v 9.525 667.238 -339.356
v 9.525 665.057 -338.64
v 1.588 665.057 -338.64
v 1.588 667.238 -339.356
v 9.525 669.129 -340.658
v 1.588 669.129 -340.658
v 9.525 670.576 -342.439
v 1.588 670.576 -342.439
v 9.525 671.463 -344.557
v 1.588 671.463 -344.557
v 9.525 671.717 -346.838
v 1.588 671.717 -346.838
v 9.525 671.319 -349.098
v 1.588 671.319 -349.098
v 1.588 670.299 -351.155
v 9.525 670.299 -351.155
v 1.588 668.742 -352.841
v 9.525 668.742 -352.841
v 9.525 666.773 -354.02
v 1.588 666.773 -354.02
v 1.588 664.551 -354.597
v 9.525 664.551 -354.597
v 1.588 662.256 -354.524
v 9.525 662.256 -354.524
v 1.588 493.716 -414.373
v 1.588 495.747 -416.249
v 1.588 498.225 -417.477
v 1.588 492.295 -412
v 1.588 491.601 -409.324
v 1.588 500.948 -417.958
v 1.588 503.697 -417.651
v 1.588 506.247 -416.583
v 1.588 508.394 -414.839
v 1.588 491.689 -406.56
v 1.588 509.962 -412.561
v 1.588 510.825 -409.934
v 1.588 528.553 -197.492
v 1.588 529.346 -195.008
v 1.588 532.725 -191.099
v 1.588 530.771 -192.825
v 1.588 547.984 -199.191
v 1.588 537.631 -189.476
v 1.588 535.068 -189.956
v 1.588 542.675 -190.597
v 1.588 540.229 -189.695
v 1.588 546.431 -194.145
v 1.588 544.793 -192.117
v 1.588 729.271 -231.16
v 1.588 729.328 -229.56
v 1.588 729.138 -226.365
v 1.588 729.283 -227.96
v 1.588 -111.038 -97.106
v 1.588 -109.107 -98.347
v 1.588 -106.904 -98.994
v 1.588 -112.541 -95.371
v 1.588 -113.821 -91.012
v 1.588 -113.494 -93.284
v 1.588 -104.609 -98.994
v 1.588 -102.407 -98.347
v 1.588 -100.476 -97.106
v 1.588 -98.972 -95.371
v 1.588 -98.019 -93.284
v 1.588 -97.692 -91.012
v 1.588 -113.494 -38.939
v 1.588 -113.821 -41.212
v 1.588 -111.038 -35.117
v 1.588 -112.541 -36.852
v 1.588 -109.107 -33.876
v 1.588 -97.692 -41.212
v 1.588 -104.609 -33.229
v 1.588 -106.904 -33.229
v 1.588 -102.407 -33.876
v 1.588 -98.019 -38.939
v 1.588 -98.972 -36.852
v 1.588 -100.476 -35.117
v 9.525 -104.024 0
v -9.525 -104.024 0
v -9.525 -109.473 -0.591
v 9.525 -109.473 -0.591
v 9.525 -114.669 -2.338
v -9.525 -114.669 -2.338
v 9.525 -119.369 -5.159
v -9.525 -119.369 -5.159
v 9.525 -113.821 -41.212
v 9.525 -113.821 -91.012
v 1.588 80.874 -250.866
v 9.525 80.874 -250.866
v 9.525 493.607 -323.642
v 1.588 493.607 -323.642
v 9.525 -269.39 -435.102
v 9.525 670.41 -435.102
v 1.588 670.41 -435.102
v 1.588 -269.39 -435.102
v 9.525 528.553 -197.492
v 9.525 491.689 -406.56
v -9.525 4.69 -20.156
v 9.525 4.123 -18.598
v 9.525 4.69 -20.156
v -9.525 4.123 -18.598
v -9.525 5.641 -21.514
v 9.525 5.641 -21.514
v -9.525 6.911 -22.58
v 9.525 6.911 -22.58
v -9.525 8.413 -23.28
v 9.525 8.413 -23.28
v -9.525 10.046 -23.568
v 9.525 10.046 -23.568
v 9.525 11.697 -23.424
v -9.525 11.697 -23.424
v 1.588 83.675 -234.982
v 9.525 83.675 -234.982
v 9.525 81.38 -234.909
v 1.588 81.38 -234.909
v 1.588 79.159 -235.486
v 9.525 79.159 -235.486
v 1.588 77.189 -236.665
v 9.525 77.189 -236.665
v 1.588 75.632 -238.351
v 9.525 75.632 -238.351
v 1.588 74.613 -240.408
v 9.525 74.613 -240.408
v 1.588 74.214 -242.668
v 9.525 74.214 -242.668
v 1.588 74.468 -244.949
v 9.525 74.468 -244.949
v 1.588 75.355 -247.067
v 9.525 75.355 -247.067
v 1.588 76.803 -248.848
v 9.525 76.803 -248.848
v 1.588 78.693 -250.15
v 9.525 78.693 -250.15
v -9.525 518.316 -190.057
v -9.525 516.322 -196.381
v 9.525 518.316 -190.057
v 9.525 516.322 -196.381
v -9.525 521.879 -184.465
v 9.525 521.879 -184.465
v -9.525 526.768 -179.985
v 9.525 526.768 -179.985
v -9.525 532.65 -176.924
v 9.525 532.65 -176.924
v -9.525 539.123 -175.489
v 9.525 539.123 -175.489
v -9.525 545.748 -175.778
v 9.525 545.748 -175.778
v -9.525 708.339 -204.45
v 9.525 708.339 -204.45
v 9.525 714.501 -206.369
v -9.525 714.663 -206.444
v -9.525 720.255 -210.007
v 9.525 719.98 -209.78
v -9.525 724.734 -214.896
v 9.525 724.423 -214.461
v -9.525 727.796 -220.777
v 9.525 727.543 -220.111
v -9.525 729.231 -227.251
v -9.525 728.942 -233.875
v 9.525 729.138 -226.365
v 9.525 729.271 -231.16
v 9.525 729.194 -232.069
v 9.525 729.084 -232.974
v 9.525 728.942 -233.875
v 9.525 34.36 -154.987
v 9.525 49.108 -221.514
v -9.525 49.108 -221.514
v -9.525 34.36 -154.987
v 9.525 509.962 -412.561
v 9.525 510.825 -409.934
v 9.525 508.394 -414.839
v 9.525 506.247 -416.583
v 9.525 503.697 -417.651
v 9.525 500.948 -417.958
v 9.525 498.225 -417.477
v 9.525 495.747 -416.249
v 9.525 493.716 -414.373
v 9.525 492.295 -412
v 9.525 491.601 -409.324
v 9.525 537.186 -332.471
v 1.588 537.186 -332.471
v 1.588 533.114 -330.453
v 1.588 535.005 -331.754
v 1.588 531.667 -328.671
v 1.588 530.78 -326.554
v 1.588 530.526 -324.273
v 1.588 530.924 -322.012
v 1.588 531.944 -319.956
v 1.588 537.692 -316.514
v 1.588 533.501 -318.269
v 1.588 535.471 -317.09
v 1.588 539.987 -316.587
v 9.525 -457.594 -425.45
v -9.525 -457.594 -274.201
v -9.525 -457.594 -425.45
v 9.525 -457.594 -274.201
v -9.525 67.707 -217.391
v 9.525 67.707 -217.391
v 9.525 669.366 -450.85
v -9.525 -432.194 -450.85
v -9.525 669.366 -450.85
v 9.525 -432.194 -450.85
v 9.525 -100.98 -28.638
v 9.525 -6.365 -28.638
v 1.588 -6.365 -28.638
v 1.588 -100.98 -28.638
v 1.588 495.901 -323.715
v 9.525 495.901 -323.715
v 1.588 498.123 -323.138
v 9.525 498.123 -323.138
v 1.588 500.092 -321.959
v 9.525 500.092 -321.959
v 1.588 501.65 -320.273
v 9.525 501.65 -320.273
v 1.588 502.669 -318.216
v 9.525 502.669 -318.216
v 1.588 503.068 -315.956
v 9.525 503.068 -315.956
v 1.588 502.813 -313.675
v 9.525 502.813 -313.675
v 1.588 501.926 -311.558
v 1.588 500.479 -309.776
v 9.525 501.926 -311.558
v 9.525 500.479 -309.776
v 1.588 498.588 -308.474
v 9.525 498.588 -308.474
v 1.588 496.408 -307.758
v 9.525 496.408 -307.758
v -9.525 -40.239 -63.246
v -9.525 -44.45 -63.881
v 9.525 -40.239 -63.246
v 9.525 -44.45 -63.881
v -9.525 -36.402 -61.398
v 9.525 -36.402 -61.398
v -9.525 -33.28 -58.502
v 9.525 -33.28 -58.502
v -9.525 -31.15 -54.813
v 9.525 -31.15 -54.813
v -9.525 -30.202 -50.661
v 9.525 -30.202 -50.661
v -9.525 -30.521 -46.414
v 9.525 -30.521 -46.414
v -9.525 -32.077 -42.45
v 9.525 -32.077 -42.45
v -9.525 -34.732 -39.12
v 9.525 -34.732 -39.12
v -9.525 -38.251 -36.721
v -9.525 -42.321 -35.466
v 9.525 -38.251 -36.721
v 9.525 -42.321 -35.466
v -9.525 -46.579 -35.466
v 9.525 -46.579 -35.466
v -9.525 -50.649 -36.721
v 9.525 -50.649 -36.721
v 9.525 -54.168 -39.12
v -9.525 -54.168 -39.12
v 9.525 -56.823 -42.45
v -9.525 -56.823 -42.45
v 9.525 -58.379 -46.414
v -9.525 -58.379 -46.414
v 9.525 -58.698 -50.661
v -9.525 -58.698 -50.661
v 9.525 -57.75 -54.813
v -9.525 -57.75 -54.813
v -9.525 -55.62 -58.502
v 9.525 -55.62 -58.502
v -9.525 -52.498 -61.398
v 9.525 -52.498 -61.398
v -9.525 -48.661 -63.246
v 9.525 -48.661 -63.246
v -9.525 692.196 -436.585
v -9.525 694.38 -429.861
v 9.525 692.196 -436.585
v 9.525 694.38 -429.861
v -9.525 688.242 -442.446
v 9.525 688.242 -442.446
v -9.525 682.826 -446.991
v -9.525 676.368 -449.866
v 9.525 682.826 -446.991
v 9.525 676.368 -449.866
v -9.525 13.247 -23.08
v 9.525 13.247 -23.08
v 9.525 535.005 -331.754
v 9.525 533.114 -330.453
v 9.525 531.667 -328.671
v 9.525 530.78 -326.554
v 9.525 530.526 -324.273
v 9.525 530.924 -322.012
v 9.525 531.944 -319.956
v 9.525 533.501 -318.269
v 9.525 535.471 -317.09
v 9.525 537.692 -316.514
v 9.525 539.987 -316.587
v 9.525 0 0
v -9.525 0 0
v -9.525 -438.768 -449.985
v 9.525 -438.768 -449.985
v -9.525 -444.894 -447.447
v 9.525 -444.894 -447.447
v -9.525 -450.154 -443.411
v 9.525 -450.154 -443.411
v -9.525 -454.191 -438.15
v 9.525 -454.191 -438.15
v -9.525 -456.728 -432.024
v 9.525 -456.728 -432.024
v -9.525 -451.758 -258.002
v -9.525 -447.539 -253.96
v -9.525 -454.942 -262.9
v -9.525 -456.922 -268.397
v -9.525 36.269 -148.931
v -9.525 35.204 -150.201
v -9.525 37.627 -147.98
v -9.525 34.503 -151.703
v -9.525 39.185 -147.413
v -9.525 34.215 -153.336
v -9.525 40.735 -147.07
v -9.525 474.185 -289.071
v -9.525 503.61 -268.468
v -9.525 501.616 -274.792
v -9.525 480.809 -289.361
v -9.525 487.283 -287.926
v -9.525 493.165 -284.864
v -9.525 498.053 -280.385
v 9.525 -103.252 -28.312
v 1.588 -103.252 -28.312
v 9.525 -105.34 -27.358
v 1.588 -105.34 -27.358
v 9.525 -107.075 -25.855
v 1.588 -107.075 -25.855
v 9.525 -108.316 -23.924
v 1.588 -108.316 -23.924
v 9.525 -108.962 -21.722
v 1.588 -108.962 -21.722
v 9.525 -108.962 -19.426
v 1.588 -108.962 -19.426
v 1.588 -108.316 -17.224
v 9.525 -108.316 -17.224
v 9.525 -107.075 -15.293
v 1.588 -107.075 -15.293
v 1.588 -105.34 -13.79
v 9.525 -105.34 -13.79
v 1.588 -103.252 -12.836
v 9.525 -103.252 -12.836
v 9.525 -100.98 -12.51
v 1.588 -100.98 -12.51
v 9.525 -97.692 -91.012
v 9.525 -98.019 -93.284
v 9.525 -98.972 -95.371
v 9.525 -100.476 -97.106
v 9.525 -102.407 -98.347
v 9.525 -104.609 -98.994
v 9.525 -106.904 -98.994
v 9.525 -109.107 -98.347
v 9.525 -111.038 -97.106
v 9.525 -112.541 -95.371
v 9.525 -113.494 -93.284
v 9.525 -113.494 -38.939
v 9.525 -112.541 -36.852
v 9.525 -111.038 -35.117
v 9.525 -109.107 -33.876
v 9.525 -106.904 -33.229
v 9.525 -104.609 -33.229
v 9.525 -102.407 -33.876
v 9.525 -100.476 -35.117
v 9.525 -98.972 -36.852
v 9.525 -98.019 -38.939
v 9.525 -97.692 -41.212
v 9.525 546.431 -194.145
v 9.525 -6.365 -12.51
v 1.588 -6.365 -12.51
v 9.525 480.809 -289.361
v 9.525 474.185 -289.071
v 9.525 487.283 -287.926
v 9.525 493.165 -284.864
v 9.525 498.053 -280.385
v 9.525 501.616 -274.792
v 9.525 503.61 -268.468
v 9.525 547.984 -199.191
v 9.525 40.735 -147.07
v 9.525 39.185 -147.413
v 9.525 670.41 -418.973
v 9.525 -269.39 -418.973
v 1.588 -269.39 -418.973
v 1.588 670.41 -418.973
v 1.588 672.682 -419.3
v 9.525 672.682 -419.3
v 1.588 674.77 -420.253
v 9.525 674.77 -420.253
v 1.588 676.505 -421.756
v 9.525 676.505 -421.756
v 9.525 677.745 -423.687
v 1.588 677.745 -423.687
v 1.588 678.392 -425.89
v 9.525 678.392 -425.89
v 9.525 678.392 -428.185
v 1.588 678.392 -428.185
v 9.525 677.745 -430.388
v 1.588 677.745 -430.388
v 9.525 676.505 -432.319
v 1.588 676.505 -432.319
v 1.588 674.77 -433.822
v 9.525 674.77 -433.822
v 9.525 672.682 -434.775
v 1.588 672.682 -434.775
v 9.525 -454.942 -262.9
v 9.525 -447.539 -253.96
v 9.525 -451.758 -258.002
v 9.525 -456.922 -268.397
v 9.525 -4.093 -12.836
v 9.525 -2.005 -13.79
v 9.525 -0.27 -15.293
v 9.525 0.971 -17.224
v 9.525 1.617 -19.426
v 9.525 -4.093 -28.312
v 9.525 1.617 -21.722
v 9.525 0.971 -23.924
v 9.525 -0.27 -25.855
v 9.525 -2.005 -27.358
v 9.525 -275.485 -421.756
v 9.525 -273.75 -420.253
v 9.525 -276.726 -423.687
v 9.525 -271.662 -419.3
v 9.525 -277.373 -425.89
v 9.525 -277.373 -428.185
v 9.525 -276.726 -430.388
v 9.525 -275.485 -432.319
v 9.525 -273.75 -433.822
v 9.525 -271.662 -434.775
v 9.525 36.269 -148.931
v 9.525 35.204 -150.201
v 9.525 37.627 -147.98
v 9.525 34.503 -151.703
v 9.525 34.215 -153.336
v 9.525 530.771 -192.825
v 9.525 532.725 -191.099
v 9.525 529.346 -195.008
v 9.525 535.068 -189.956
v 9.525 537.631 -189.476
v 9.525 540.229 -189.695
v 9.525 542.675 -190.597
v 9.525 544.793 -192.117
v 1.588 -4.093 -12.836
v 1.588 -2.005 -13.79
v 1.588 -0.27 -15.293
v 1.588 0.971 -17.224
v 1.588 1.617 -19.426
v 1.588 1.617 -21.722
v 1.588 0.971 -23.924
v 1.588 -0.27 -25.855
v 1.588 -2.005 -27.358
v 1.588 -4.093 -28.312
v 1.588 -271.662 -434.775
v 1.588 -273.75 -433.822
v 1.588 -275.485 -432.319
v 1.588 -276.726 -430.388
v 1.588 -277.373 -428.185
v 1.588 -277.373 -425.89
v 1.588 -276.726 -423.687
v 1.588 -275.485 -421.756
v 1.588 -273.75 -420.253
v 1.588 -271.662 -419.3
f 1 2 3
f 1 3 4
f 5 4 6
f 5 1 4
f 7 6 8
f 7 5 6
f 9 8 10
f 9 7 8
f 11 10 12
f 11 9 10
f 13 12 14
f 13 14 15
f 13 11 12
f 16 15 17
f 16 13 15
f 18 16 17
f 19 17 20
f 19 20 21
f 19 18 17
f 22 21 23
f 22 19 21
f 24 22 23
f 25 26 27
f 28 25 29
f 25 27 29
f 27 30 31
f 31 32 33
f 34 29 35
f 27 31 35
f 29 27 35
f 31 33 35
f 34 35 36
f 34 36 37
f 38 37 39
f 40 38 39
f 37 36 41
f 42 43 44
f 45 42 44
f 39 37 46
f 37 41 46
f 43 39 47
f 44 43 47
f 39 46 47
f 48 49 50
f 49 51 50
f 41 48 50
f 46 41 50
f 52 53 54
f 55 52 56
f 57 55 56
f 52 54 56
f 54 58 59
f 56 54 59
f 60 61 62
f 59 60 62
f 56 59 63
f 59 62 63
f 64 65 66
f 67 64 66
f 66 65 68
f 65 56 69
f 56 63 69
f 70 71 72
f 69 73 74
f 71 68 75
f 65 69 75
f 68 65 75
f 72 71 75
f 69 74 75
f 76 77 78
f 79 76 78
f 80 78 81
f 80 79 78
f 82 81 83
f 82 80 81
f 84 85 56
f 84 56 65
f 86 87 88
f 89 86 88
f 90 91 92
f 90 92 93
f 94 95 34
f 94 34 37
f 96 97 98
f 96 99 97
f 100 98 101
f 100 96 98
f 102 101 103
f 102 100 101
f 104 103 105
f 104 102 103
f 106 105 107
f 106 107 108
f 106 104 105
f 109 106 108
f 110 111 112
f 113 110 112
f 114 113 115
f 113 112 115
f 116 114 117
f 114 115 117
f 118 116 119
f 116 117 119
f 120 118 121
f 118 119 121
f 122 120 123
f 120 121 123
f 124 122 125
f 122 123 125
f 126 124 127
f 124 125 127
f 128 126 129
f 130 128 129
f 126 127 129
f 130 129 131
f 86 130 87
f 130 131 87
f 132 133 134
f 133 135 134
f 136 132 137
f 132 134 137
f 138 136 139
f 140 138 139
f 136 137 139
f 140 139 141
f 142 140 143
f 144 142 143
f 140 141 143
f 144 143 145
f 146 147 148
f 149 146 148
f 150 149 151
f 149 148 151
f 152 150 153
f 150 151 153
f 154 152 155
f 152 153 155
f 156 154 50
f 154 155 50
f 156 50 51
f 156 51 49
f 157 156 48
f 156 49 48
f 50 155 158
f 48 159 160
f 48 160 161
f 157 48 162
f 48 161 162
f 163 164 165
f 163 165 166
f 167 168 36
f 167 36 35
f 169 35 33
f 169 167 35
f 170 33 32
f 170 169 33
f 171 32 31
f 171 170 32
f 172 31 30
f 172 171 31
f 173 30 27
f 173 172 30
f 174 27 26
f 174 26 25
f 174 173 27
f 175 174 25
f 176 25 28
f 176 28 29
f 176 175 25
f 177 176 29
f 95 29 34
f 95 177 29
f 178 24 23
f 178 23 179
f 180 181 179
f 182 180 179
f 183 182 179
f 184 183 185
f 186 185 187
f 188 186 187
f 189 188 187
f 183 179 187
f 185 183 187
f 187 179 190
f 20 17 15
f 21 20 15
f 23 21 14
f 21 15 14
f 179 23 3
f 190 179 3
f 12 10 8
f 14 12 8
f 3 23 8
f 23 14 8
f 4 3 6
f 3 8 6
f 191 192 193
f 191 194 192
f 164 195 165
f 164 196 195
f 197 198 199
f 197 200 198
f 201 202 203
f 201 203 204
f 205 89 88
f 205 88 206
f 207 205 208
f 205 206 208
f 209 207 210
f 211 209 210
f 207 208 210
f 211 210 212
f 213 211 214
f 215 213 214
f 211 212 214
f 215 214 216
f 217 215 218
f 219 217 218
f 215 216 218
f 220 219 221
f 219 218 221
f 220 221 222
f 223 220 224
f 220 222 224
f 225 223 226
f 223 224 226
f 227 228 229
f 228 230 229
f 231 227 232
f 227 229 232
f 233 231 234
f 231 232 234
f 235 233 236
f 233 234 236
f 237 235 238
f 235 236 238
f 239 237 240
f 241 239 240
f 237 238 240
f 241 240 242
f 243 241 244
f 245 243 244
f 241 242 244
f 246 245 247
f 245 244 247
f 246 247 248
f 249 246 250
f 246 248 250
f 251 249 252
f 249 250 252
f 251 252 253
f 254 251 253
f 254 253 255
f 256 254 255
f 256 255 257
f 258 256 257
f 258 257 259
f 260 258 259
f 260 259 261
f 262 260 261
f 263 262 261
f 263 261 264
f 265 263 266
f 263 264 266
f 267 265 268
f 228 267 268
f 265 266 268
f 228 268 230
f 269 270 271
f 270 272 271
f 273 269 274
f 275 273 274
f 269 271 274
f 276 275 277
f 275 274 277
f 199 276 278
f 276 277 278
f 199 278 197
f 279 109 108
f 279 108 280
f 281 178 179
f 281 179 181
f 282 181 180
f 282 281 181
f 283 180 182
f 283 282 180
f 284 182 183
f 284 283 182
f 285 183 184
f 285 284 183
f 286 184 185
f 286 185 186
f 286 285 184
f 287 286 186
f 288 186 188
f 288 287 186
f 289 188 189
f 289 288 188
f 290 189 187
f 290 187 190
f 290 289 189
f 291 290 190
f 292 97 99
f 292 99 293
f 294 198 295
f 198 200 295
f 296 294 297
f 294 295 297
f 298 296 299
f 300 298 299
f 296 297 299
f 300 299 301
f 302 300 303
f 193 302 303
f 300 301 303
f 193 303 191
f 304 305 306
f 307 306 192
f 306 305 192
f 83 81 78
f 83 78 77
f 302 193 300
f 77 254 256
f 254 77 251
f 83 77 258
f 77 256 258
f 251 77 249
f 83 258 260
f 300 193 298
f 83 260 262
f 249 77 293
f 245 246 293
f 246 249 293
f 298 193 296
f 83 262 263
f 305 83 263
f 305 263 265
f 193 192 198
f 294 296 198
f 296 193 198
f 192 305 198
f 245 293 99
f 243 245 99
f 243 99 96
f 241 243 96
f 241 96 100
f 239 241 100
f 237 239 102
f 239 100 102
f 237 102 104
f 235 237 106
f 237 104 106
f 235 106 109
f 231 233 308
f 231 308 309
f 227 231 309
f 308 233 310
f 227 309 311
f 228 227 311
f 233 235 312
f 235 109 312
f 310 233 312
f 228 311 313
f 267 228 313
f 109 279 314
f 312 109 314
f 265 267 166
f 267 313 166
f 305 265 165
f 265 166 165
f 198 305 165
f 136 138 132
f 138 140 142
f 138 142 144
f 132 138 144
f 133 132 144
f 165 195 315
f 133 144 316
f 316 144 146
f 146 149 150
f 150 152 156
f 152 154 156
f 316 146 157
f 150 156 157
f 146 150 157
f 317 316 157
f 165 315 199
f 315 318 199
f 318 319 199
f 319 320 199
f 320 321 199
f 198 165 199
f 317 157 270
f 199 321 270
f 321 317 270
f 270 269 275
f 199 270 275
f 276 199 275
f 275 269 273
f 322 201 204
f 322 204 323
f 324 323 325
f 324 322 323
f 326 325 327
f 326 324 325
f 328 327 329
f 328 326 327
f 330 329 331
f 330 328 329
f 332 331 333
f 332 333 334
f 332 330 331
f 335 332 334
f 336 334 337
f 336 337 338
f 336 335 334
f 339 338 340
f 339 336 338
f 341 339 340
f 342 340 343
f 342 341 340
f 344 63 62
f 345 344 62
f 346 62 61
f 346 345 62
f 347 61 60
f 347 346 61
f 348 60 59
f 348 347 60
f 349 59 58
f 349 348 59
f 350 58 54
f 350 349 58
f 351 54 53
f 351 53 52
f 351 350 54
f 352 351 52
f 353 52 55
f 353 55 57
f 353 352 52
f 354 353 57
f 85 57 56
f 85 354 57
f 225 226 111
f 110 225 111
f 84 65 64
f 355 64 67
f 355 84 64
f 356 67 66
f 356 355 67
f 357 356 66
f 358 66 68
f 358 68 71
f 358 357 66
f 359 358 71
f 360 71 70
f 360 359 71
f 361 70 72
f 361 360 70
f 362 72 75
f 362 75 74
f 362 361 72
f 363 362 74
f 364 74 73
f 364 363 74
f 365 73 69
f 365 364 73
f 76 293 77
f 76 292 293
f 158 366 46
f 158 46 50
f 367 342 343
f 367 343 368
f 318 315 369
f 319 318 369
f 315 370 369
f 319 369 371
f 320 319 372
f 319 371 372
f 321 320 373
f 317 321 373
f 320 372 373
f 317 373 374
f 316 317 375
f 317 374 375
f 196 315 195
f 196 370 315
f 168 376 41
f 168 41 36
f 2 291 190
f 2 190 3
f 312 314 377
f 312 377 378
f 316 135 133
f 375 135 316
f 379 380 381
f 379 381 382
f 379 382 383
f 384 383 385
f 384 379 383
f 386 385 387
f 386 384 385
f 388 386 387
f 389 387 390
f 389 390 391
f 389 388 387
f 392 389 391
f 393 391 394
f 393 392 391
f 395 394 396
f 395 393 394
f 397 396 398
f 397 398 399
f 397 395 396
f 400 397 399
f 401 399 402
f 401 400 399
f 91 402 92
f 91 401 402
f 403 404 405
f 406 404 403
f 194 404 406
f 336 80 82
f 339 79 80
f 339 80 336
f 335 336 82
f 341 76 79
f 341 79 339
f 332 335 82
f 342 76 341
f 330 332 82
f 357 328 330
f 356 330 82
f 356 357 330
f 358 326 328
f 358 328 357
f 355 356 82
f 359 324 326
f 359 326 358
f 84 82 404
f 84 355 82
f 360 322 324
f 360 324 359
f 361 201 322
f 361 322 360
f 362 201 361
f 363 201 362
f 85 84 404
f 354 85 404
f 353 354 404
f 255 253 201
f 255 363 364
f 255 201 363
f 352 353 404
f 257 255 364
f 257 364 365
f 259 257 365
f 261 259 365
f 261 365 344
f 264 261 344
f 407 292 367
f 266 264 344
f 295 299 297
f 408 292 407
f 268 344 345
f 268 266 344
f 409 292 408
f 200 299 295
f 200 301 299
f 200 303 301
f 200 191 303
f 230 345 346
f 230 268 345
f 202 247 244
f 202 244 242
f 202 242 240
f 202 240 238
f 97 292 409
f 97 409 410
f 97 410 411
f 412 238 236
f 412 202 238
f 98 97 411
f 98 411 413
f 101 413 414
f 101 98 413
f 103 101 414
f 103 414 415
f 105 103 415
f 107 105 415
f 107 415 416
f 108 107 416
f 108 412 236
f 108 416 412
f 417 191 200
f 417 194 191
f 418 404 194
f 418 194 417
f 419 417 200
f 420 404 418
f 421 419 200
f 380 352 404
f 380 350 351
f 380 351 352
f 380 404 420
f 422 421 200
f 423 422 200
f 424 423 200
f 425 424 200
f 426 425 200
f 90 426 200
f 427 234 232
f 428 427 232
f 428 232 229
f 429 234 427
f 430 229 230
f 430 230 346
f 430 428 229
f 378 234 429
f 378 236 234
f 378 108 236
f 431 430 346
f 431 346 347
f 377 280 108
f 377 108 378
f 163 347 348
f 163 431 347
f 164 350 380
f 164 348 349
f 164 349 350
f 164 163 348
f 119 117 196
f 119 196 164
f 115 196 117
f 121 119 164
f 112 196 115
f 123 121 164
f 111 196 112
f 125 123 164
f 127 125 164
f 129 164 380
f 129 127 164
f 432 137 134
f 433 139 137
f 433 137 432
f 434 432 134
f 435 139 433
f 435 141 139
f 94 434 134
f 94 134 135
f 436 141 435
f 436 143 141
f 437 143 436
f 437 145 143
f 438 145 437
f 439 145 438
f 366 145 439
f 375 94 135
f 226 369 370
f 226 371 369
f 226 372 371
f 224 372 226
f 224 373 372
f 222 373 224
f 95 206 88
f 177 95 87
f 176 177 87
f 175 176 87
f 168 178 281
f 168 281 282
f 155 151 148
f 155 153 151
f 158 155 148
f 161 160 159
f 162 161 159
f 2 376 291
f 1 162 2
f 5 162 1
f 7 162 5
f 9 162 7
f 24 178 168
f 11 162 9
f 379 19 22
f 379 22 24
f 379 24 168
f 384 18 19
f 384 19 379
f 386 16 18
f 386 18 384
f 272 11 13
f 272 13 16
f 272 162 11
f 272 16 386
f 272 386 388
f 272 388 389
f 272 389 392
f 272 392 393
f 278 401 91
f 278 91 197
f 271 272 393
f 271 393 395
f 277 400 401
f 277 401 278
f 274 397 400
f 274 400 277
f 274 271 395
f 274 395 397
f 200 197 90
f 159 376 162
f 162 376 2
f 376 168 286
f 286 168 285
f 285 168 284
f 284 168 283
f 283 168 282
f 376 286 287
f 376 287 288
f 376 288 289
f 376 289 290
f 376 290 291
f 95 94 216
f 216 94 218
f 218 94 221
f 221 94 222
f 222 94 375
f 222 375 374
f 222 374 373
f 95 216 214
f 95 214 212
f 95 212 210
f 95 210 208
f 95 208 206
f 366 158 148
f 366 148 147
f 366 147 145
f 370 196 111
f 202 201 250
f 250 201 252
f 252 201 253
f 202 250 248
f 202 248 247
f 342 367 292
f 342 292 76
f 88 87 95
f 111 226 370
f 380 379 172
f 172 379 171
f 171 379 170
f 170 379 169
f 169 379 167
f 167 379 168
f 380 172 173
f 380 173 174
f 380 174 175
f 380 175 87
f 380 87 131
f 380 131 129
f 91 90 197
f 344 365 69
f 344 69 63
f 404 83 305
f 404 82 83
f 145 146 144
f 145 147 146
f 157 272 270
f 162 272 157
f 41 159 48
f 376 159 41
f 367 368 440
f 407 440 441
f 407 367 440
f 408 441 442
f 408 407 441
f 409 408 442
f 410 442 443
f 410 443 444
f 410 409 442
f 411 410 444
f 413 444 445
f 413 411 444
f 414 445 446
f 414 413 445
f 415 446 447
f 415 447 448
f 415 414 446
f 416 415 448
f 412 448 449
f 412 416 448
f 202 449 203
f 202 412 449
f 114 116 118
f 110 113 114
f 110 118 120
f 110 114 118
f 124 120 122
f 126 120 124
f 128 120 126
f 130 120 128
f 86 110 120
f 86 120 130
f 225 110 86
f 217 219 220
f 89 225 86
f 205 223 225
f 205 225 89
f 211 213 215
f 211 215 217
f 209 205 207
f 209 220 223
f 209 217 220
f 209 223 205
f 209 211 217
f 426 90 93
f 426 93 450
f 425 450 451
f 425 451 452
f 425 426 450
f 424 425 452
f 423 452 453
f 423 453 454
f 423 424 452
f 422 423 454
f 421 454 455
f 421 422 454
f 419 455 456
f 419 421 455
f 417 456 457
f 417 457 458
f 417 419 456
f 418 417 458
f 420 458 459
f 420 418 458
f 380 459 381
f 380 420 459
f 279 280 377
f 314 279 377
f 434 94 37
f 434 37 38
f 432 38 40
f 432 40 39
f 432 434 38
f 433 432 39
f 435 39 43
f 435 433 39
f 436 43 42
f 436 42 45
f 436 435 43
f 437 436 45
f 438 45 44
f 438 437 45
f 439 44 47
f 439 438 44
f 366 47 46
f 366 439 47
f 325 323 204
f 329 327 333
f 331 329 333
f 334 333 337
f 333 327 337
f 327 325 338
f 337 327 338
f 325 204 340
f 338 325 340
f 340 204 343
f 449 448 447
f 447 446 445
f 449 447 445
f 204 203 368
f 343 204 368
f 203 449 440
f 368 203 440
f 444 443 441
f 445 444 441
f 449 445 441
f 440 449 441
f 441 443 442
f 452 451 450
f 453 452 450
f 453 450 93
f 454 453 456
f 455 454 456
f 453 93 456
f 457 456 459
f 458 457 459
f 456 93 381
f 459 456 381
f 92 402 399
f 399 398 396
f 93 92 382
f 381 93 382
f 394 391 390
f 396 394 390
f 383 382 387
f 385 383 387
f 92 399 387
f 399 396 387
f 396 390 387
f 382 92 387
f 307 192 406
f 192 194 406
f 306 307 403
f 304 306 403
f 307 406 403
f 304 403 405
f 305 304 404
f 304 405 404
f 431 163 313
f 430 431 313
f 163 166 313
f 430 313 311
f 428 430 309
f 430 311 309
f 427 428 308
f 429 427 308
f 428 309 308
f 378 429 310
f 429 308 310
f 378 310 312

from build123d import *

# Parameters (mm, degrees)
BOSS_EXTRUDE1_DEPTH     = 9.525
FILLET1_R               = 25.4
BOSS_EXTRUDE2_DEPTH     = 19.05
FILLET2_R               = 6.35
CUT_EXTRUDE1_DEPTH      = 7.9375
SKETCH9_R               = 14.2875
CUT_EXTRUDE3_DEPTH      = 10.525
CUT_EXTRUDE3_DEPTH_BACK = 10.525


with BuildPart() as part:
    # Sketch1 → Boss-Extrude1 (new body, symmetric)
    with BuildSketch(Plane(origin=(0, 0, 0), x_dir=(0, 0, -1), z_dir=(1, 0, 0))):
        Polygon((0, 0), (0, -112.563749307), (261.582885953, -457.593888215), (450.85, -457.593888215), (450.85, 690.679166755), (208.861297127, 733.352902663), (171.366736958, 520.733599781), (293.482501466, 499.198975136), (217.390599948, 67.706860465), (221.513774593, 49.108421529), align=None)
    extrude(amount=BOSS_EXTRUDE1_DEPTH, both=True)

    # Fillet1
    fillet1_edges = [part.edges().sort_by_distance(p)[0] for p in [
        (0, 499.198975136, -293.482501466),
        (0, 520.733599781, -171.366736958),
        (0, 733.352902663, -208.861297127),
        (0, 690.679166755, -450.85),
        (0, -457.593888215, -450.85),
        (0, -457.593888215, -261.582885953),
        (0, -112.563749307, 0),
    ]]
    fillet(fillet1_edges, radius=FILLET1_R)

    # Sketch5 → Boss-Extrude2 (add)
    with BuildSketch(Plane(origin=(9.525, 0, 0), x_dir=(0, 0, -1), z_dir=(1, 0, 0))):
        Polygon((24.797918581, 5.497566194), (23.079929145, 13.246915751), (147.069522049, 40.734746721), (148.787511485, 32.985397164), align=None)
    extrude(amount=-BOSS_EXTRUDE2_DEPTH)

    # Fillet2
    fillet2_edges = [part.edges().sort_by_distance(p)[0] for p in [
        (0, 32.985397164, -148.787511485),
        (0, 5.497566194, -24.797918581),
    ]]
    fillet(fillet2_edges, radius=FILLET2_R)

    # Sketch6 → Cut-Extrude1 (cut)
    with BuildSketch(Plane(origin=(9.525, 0, 0), x_dir=(0, 0, -1), z_dir=(1, 0, 0))):
        with BuildLine():
            Line((28.6385, -6.365075015), (28.6385, -100.980075015))
            ThreePointArc((28.6385, -100.980075015), (20.574, -109.044575015), (12.5095, -100.980075015))
            Line((12.5095, -100.980075015), (12.5095, -6.365075015))
            ThreePointArc((12.5095, -6.365075015), (20.574, 1.699424985), (28.6385, -6.365075015))
        make_face()
        with BuildLine():
            Line((418.973, -269.390231885), (418.973, 670.409768115))
            ThreePointArc((418.973, 670.409768115), (427.0375, 678.474268115), (435.102, 670.409768115))
            Line((435.102, 670.409768115), (435.102, -269.390231885))
            ThreePointArc((435.102, -269.390231885), (427.0375, -277.454731885), (418.973, -269.390231885))
        make_face()
        with BuildLine():
            Line((354.524032203, 662.256458615), (332.470713639, 537.185873983))
            ThreePointArc((332.470713639, 537.185873983), (323.128345786, 530.644277587), (316.586749391, 539.98664544))
            Line((316.586749391, 539.98664544), (338.640067954, 665.057230073))
            ThreePointArc((338.640067954, 665.057230073), (347.982435807, 671.598826468), (354.524032203, 662.256458615))
        make_face()
        with BuildLine():
            Line((406.559861559, 491.68872453), (197.491872287, 528.553051841))
            ThreePointArc((197.491872287, 528.553051841), (189.629312583, 536.333399232), (194.145410605, 546.430849865))
            Line((194.145410605, 546.430849865), (228.335527156, 740.311741223))
            ThreePointArc((228.335527156, 740.311741223), (231.057354489, 742.217510482), (232.963123748, 739.495683149))
            Line((232.963123748, 739.495683149), (199.190848291, 547.984231028))
            Line((199.190848291, 547.984231028), (409.934019299, 510.824523979))
            ThreePointArc((409.934019299, 510.824523979), (417.814840153, 499.569545384), (406.559861559, 491.68872453))
        make_face()
        with BuildLine():
            Line((250.866088981, 80.873965121), (323.642040242, 493.606894408))
            ThreePointArc((323.642040242, 493.606894408), (317.100443846, 502.949262261), (307.758075993, 496.407665866))
            Line((307.758075993, 496.407665866), (234.982124733, 83.674736578))
            ThreePointArc((234.982124733, 83.674736578), (241.523721128, 74.332368726), (250.866088981, 80.873965121))
        make_face()
        with BuildLine():
            Line((41.2115, -97.692152626), (91.0115, -97.692152626))
            ThreePointArc((91.0115, -97.692152626), (99.076, -105.756652626), (91.0115, -113.821152626))
            Line((91.0115, -113.821152626), (41.2115, -113.821152626))
            ThreePointArc((41.2115, -113.821152626), (33.147, -105.756652626), (41.2115, -97.692152626))
        make_face()
    extrude(amount=-CUT_EXTRUDE1_DEPTH, mode=Mode.SUBTRACT)

    # Sketch9 → Cut-Extrude3 (cut, two sides)
    with BuildSketch(Plane(origin=(0, 0, 0), x_dir=(0, 0, -1), z_dir=(1, 0, 0))) as cut_extrude3_sk:
        with Locations((49.5935, -44.45)):
            Circle(SKETCH9_R)
    extrude(amount=CUT_EXTRUDE3_DEPTH, mode=Mode.SUBTRACT)
    extrude(cut_extrude3_sk.sketch, amount=-CUT_EXTRUDE3_DEPTH_BACK, mode=Mode.SUBTRACT)


solid = part.part
